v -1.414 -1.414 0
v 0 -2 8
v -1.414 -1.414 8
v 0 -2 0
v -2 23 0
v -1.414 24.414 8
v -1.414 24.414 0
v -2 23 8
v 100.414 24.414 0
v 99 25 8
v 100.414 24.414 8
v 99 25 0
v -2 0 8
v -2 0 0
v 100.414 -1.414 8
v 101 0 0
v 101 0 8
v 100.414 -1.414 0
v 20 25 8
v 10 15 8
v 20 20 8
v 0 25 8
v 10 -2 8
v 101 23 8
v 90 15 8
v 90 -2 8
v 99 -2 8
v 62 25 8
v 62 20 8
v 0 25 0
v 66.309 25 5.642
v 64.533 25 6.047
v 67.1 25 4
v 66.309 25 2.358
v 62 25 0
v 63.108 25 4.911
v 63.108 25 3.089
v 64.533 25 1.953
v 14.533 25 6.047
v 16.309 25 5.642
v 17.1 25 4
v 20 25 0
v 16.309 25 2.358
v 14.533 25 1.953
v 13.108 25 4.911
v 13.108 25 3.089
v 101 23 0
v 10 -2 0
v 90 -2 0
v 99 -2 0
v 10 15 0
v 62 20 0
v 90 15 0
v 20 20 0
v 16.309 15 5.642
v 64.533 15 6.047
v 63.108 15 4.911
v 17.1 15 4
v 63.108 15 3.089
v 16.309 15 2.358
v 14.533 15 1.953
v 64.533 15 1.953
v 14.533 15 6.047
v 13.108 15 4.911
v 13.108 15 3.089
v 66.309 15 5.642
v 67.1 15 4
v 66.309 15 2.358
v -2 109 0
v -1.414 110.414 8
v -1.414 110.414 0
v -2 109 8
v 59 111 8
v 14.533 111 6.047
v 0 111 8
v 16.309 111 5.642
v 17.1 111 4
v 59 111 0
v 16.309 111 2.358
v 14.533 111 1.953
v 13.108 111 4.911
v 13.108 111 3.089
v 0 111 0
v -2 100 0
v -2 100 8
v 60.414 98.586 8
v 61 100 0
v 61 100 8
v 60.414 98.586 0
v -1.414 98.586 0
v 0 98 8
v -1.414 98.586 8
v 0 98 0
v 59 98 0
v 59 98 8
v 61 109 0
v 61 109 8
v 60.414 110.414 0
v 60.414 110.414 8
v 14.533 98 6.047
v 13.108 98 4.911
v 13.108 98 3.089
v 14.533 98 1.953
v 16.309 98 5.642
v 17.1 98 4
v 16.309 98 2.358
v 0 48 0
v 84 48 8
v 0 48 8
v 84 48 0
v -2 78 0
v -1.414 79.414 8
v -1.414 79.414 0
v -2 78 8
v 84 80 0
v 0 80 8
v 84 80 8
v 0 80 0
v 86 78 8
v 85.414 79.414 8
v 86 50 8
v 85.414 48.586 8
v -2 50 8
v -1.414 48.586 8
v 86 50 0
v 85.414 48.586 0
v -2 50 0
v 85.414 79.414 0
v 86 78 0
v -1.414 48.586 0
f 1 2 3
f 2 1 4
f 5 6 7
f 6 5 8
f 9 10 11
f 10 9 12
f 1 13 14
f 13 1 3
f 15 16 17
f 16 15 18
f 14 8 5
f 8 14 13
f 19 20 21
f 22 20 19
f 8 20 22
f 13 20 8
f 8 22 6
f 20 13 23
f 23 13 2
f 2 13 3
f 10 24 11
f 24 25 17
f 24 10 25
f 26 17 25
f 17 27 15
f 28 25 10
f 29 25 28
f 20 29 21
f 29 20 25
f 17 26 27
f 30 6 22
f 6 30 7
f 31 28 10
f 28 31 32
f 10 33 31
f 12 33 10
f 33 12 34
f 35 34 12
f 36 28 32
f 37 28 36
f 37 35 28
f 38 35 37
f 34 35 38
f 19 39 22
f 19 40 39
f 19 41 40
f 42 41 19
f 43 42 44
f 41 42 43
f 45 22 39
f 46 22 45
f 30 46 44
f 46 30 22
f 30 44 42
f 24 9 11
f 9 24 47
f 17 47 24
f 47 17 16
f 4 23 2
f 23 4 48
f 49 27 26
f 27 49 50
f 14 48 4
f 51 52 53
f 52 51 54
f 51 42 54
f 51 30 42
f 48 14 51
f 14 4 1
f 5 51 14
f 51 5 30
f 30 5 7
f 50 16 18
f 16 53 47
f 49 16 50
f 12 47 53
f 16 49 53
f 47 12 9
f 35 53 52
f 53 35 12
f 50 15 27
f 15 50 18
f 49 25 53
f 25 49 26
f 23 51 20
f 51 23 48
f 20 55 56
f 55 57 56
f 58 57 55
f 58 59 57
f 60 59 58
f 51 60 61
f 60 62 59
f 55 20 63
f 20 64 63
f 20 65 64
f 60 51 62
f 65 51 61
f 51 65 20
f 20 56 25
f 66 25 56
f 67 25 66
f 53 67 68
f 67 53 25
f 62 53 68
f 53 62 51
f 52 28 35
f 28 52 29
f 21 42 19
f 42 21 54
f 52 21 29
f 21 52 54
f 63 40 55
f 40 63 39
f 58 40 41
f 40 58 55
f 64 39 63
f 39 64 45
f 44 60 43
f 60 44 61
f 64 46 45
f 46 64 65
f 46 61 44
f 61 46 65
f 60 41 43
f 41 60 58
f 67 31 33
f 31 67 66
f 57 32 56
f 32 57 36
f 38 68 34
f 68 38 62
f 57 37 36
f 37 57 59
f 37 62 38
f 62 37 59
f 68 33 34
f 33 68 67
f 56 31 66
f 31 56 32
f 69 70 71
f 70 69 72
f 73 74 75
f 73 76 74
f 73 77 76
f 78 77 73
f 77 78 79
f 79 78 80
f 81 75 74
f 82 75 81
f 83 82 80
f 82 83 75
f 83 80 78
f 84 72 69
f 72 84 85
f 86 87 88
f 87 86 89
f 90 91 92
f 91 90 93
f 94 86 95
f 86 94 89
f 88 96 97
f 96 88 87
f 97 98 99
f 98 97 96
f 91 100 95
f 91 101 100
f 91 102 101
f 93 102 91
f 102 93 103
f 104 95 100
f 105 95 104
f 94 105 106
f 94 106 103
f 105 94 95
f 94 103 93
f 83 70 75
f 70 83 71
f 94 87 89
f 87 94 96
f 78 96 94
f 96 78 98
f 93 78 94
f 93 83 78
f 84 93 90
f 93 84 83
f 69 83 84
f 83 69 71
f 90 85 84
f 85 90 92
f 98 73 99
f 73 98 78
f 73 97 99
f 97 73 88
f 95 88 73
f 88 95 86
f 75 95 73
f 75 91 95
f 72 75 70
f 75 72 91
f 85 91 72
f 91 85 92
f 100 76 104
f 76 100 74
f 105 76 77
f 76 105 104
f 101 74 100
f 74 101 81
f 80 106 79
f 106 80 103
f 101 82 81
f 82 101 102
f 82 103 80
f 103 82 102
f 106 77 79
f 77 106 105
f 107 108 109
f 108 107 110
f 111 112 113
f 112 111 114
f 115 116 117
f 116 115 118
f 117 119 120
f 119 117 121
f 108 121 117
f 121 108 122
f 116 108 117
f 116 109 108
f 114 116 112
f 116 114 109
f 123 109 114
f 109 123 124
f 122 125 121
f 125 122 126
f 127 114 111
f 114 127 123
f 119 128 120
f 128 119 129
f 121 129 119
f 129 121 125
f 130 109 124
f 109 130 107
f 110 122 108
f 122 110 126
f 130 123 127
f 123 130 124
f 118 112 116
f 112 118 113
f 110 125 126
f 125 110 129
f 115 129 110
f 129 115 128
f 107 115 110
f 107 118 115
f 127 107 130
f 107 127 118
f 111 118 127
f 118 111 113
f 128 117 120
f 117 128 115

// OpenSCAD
// Smartrap 
// author : serge vieillescaze - smartfriendz
// version 0.4.6 - 12/08/2013

//variabless
base_z = 7;
radius_rods = 4;
radius_M4 = 2.1;
radius_bearing_holder = 7.5;
radius_filament = 0.875;
nema = 17;
linear_system = "fishing_line";


// ---------  MAIN ----------
all();

// draw all
module all()
base_y();
translate([0,50,0])
base_center();
translate([0,100,0])
base_back();

// parts
module base_y()
	difference(){		
		miniround([100,24,base_z],2);
	translate([10,-10,-1]) 
		cube([80,25,10]); 
	translate([20,20,-1]) 
		cube([42,10,10]);
	translate([15,28,4]) rotate([90,0,0])
		cylinder(h=20,r=radius_M4);
	translate([65,28,4]) rotate([90,0,0])
		cylinder(h=20,r=radius_M4);
	}
		
module base_center()
	difference(){
		miniround([85,29,base_z],2);
	}

module base_back()
	difference(){
		miniround([60,10,base_z],2);
	translate([15,12,4]) rotate([90,0,0])
		cylinder(h=20,r=radius_M4);
	}

module plate_base()
	difference(){
		miniround([100,60,base_z],2);
	translate([10,-10,-1]) 
		cube([80,25,10]); 
	translate([15,28,4]) rotate([90,0,0])
		cylinder(h=20,r=2.1);
	}

module plate_x()
	difference(){
		miniround([100,60,base_z],2);
	translate([10,-10,-1]) 
		cube([80,25,10]); 
	translate([15,28,4]) rotate([90,0,0])
		cylinder(h=20,r=2.1);
	}

module plate_y()
	difference(){
		miniround([100,60,base_z],2);
	translate([10,-10,-1]) 
		cube([80,25,10]); 
	translate([15,28,4]) rotate([90,0,0])
		cylinder(h=20,r=2.1);
	}

module xend_jhead()
	difference(){
		miniround([100,60,base_z],2);
	translate([10,-10,-1]) 
		cube([80,25,10]); 
	translate([15,28,4]) rotate([90,0,0])
		cylinder(h=20,r=2.1);
	}

module xend_back()
	difference(){
		miniround([100,60,base_z],2);
	translate([10,-10,-1]) 
		cube([80,25,10]); 
	translate([15,28,4]) rotate([90,0,0])
		cylinder(h=20,r=2.1);
	}

module yend_front()
	difference(){
		miniround([100,60,base_z],2);
	translate([10,-10,-1]) 
		cube([80,25,10]); 
	translate([15,28,4]) rotate([90,0,0])
		cylinder(h=20,r=2.1);
	}

module yend_back()
	difference(){
		miniround([100,60,base_z],2);
	translate([10,-10,-1]) 
		cube([80,25,10]); 
	translate([15,28,4]) rotate([90,0,0])
		cylinder(h=20,r=2.1);
	}

module bearingsholder_x()
	difference(){
		miniround([100,60,base_z],2);
	translate([10,-10,-1]) 
		cube([80,25,10]); 
	translate([15,28,4]) rotate([90,0,0])
		cylinder(h=20,r=2.1);
	}

module bearingsholder_base_front()
	difference(){
		miniround([100,60,base_z],2);
	translate([10,-10,-1]) 
		cube([80,25,10]); 
	translate([15,28,4]) rotate([90,0,0])
		cylinder(h=20,r=2.1);
	}

module bearingsholder_base_back()
	difference(){
		miniround([100,60,base_z],2);
	translate([10,-10,-1]) 
		cube([80,25,10]); 
	translate([15,28,4]) rotate([90,0,0])
		cylinder(h=20,r=2.1);
	}

module fishingline_tensioner()
	difference(){
		miniround([100,60,base_z],2);
	translate([10,-10,-1]) 
		cube([80,25,10]); 
	translate([15,28,4]) rotate([90,0,0])
		cylinder(h=20,r=2.1);
	}




// lib -----------------------------

module miniround(size, radius)
{
$fn=8;
x = size[0]-radius/2;
y = size[1]-radius/2;

minkowski()
{
cube(size=[x,y,size[2]]);
cylinder(r=radius);
// Using a sphere is possible, but will kill performance
//sphere(r=radius);
}
}
